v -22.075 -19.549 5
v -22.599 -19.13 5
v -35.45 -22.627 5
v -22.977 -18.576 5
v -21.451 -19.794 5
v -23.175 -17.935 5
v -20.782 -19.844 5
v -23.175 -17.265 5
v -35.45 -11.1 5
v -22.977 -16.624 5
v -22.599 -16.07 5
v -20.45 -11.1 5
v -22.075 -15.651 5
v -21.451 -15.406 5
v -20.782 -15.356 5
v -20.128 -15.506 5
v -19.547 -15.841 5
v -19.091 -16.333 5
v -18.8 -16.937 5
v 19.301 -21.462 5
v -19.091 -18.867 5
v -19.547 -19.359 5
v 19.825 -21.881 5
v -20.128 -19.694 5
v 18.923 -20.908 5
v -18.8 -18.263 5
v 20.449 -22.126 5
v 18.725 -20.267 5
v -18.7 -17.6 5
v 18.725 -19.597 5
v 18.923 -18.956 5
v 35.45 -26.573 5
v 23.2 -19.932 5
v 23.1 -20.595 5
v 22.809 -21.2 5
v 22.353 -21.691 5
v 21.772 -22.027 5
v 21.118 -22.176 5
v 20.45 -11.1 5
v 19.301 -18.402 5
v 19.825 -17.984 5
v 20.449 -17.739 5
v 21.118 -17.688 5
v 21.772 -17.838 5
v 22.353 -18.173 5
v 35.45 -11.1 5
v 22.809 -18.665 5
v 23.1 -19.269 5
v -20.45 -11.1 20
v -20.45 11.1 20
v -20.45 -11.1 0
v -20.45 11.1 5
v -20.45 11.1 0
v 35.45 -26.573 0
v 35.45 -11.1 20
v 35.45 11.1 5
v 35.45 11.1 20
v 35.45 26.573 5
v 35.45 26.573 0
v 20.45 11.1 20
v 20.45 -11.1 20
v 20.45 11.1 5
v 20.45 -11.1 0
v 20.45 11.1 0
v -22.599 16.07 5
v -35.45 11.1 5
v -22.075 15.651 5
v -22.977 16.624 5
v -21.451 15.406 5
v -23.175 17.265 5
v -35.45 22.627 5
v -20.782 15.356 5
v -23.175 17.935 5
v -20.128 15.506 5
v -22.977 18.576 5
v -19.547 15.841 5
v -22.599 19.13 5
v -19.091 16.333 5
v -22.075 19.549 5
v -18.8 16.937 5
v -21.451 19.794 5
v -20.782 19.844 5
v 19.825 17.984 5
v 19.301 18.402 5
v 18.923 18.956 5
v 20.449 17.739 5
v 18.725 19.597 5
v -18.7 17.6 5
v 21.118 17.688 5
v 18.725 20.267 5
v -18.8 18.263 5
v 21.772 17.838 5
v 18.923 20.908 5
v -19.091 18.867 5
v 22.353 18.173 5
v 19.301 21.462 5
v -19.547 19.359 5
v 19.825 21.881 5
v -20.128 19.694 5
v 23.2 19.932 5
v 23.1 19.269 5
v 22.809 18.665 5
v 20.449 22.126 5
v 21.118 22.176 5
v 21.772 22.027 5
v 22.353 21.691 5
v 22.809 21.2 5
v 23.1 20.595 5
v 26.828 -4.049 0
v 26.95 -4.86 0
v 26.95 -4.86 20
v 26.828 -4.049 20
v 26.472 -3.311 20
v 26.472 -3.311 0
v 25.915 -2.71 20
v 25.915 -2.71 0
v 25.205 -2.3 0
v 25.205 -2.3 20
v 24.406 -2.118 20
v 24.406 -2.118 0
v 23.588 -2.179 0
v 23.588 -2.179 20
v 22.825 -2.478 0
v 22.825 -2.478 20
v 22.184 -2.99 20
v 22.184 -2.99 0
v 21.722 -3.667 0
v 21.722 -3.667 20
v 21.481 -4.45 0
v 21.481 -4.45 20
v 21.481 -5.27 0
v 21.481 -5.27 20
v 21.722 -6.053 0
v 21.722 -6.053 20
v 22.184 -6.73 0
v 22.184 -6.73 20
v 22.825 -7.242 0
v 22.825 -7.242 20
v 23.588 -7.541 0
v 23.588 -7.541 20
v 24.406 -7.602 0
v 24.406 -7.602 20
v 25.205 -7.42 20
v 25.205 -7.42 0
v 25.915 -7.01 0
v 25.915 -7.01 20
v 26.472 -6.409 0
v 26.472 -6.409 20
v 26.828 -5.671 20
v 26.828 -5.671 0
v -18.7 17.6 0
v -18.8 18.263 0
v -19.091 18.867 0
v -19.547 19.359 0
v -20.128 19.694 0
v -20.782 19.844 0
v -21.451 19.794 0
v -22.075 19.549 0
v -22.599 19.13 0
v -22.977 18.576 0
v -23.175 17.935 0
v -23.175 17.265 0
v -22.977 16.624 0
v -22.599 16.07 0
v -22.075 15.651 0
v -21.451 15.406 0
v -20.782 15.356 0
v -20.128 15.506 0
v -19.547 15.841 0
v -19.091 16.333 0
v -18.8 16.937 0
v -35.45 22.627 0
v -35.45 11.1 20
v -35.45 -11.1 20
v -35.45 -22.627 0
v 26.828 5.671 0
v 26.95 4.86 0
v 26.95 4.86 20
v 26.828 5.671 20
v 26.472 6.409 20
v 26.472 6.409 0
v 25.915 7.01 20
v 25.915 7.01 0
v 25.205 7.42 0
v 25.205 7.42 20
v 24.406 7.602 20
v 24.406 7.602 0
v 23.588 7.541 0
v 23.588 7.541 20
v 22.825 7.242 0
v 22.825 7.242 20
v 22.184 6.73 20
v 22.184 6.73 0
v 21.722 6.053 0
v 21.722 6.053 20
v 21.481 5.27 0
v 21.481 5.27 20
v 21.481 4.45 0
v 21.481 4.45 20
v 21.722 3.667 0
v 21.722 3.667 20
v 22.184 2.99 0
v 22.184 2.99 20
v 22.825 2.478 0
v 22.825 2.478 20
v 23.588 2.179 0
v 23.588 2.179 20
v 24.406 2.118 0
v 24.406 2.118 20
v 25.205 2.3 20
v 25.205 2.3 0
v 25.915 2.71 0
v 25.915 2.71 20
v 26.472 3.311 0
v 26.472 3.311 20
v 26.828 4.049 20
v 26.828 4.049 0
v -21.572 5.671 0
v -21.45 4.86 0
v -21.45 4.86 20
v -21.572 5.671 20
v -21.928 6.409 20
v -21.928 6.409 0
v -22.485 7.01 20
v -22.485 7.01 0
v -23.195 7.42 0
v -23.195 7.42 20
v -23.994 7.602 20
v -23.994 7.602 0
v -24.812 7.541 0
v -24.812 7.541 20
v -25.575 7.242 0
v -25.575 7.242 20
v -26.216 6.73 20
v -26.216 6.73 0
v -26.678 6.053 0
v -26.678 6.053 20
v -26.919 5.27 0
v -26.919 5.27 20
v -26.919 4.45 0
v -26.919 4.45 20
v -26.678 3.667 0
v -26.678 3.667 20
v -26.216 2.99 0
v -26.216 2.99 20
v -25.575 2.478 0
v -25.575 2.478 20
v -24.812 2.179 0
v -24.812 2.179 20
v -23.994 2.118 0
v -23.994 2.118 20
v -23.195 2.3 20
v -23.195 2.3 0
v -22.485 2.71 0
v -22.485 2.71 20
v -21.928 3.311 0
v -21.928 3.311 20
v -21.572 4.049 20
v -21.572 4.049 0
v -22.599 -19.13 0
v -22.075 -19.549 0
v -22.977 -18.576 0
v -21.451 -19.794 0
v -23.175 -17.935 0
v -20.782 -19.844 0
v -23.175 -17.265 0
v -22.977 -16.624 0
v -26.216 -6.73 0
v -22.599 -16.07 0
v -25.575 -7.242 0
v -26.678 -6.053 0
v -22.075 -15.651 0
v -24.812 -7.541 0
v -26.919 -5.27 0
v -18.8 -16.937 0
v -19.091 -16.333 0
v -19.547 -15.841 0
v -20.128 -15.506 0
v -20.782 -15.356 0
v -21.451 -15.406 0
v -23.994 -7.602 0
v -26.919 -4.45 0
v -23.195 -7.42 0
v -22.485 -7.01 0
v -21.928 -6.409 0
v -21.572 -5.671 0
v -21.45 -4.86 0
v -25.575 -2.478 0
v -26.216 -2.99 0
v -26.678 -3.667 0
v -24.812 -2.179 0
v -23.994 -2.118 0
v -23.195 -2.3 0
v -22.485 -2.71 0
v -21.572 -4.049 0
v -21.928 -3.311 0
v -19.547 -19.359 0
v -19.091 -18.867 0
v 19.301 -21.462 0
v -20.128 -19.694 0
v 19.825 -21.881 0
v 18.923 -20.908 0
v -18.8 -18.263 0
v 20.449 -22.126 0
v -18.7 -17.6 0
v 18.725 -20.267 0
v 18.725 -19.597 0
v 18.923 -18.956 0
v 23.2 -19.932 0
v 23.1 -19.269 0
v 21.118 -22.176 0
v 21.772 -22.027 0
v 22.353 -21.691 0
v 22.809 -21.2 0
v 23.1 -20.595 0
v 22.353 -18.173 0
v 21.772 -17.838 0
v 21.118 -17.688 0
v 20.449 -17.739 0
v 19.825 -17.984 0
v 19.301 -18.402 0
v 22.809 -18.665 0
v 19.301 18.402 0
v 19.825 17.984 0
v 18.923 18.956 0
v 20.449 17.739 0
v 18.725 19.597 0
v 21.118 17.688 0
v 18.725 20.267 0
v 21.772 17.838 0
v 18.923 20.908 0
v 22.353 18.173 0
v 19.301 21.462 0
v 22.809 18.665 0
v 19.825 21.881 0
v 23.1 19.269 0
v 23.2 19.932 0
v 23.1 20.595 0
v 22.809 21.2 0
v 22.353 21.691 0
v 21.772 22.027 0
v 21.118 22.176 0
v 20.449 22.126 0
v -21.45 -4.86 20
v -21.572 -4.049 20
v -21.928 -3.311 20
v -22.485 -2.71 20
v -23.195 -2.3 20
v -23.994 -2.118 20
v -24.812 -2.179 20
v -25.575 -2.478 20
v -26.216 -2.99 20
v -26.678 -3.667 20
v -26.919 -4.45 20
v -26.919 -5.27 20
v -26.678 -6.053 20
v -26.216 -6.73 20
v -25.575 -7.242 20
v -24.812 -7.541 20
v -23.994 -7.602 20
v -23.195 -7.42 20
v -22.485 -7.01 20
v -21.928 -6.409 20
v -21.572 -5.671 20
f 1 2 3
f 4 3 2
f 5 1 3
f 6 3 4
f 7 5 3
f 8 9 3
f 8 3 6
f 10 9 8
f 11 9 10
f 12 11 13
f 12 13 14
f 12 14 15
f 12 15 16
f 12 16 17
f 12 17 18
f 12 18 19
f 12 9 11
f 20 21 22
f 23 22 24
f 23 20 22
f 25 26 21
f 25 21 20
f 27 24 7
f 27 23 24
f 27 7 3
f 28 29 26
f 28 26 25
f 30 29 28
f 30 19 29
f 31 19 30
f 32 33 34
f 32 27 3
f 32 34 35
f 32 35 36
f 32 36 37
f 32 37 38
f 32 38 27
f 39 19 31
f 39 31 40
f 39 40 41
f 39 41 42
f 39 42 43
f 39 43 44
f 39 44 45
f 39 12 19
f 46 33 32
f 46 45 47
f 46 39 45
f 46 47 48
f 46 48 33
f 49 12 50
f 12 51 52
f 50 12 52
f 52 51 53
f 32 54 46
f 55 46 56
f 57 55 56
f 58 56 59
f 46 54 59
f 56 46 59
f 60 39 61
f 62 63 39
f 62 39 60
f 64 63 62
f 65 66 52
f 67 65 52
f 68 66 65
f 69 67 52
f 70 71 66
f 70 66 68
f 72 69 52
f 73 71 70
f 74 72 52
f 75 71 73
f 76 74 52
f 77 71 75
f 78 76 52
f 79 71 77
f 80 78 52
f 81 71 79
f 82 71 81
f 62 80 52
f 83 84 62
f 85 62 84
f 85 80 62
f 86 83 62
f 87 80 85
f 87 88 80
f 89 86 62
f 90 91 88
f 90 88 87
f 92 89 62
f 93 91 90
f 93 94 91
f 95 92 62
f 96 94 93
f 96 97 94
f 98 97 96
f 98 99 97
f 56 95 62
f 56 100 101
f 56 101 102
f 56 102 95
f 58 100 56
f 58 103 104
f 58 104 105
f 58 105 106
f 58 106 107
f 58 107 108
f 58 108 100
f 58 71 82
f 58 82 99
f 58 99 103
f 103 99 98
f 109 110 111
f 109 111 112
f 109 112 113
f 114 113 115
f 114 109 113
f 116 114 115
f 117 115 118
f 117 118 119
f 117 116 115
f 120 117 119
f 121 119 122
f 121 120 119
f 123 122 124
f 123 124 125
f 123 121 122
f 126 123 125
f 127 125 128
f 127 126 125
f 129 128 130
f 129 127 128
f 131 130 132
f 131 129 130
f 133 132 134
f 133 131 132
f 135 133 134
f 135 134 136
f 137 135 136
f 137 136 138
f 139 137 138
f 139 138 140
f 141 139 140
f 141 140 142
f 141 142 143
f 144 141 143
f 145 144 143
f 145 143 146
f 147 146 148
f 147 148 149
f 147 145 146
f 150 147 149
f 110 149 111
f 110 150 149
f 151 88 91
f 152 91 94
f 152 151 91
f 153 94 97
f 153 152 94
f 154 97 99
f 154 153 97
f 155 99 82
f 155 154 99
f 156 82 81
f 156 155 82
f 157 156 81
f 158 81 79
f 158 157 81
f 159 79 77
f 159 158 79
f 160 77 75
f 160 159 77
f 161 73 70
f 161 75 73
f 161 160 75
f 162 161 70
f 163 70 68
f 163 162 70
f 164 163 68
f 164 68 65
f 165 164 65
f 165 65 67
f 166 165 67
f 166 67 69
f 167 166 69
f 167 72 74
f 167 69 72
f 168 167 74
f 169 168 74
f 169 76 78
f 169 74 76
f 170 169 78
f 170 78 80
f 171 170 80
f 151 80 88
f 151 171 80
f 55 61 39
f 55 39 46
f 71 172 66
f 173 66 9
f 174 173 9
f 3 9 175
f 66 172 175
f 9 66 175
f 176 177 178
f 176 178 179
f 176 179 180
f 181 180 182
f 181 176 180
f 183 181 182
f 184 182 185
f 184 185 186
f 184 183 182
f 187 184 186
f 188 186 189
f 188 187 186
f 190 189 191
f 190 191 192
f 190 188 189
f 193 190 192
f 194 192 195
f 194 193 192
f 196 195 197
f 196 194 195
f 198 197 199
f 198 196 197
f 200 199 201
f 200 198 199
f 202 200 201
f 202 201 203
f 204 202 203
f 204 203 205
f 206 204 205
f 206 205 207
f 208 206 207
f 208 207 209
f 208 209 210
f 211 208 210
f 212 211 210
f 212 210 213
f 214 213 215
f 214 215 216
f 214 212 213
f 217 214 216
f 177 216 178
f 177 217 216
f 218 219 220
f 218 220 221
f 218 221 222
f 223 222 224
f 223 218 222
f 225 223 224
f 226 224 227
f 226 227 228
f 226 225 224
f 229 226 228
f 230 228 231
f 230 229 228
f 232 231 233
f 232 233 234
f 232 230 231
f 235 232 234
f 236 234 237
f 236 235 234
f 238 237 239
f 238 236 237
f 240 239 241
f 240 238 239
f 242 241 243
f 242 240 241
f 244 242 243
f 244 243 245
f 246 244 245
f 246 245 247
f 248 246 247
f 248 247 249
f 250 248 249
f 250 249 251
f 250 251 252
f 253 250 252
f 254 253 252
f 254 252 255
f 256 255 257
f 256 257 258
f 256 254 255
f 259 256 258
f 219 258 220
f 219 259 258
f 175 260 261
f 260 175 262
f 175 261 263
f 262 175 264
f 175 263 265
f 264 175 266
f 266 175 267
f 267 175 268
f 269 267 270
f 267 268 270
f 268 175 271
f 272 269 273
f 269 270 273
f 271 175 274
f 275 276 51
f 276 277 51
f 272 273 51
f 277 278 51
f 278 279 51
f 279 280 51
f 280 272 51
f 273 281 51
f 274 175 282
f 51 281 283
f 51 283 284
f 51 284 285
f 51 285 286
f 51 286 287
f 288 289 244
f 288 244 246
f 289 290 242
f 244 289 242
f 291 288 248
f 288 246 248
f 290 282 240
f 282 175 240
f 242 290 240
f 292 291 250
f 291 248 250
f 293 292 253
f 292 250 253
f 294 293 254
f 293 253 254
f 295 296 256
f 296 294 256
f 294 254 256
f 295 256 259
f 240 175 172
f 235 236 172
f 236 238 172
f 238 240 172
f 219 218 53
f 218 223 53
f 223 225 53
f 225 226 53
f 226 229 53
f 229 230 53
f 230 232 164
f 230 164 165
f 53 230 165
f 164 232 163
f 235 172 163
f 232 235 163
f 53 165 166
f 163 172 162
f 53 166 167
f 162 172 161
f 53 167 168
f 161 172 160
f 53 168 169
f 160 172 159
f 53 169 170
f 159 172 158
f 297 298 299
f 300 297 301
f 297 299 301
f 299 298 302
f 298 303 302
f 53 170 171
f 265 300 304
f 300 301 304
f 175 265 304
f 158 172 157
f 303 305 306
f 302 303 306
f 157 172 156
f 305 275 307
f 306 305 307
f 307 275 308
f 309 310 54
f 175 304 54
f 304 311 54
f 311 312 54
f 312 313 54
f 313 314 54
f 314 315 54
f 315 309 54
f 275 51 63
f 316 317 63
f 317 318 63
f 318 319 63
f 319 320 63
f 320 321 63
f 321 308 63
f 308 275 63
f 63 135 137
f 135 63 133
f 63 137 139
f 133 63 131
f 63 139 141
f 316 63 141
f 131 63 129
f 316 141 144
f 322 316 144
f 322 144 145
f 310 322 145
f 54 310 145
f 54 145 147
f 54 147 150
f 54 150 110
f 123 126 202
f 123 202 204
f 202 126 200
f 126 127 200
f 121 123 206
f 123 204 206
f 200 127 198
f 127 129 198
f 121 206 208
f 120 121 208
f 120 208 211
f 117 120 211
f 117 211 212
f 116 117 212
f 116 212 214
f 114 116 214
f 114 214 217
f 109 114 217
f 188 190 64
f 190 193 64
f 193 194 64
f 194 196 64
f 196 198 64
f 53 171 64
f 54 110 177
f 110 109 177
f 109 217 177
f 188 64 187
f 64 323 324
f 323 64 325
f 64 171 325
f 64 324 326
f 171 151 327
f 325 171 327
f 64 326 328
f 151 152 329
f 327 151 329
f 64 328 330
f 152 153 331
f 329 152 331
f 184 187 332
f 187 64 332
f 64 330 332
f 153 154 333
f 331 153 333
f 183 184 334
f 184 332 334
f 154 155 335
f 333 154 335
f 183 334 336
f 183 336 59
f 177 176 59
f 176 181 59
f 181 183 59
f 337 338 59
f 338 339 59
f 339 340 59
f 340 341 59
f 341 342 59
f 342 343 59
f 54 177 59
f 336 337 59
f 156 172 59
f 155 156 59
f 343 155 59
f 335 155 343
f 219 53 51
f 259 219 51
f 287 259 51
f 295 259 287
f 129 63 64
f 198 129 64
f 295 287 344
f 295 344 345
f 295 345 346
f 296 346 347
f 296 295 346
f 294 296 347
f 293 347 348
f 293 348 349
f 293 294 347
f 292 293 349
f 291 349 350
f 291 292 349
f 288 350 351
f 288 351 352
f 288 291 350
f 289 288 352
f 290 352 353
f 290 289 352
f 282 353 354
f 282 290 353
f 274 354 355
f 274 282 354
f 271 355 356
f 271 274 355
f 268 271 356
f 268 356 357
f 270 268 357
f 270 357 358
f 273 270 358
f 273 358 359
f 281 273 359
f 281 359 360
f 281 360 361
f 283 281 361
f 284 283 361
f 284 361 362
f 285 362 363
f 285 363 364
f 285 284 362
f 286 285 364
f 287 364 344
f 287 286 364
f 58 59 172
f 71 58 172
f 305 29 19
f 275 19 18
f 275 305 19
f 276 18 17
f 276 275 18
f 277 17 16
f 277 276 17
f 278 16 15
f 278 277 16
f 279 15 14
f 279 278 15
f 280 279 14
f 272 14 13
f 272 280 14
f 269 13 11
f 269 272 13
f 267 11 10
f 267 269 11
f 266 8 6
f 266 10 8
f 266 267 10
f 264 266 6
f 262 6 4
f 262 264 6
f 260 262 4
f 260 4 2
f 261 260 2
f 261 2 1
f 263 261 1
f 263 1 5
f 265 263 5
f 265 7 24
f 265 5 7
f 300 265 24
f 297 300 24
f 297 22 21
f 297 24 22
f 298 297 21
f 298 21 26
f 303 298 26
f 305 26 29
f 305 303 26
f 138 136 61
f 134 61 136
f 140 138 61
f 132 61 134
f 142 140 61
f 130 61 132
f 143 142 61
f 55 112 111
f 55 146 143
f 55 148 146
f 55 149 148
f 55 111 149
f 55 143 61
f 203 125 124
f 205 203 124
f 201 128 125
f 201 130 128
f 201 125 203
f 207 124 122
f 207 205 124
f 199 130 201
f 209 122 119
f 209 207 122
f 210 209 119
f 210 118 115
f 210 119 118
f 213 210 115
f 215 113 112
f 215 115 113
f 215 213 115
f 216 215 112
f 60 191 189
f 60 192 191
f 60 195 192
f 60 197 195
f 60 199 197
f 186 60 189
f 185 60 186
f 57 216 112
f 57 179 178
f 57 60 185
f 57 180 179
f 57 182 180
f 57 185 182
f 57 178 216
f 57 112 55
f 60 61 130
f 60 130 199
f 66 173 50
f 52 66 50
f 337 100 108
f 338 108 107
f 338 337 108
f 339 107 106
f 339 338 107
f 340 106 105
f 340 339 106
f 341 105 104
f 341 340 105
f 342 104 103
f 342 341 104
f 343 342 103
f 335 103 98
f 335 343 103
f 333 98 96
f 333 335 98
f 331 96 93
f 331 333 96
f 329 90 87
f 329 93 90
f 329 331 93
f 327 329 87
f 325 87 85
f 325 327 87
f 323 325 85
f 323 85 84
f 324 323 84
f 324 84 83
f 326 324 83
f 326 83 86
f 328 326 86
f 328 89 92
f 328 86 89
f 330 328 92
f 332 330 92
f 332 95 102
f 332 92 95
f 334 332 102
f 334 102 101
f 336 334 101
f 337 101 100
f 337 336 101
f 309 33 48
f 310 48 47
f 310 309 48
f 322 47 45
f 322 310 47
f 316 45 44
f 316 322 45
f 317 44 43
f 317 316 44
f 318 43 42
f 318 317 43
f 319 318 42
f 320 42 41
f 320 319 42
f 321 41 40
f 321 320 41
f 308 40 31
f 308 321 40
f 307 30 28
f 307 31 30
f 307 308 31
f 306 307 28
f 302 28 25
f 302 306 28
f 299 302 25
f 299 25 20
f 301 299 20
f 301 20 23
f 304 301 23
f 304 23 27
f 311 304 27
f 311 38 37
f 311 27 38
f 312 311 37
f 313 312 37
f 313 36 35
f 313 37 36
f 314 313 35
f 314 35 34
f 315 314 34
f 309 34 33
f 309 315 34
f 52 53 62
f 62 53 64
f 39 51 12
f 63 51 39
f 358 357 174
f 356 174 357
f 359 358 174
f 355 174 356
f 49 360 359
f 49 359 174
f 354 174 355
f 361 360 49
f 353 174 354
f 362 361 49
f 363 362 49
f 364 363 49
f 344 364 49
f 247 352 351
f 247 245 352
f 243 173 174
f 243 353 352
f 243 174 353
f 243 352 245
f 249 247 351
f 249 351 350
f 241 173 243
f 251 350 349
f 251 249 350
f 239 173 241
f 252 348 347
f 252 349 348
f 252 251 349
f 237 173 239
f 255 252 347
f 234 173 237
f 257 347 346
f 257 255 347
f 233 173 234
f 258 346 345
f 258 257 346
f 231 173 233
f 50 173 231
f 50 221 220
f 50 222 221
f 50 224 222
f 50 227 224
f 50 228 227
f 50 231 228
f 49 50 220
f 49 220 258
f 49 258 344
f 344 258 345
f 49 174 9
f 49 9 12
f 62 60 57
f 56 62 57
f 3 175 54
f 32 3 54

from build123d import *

# Parameters (mm, degrees)
SKETCH1_W           = 40.9
SKETCH1_H           = 22.2
SKETCH1_R           = 2.25
SKETCH1_R_2         = 2.75
BOSS_EXTRUDE4_DEPTH = 20
SKETCH4_W           = 70.9
SKETCH4_H           = 15.47309833
CUT_EXTRUDE1_DEPTH  = 15


with BuildPart() as part:
    # Sketch1 → Boss-Extrude4 (new body)
    with BuildSketch(Plane.XY):
        Polygon((-35.45, 22.62690167), (-35.45, -22.62690167), (35.45, -26.57309833), (35.45, 26.57309833), align=None)
        Rectangle(SKETCH1_W, SKETCH1_H, mode=Mode.SUBTRACT)
        with Locations((-20.95, 17.6)):
            Circle(SKETCH1_R, mode=Mode.SUBTRACT)
        with Locations((20.95, 19.932096475)):
            Circle(SKETCH1_R, mode=Mode.SUBTRACT)
        with Locations((-24.2, 4.86)):
            Circle(SKETCH1_R_2, mode=Mode.SUBTRACT)
        with Locations((-24.2, -4.86)):
            Circle(SKETCH1_R_2, mode=Mode.SUBTRACT)
        with Locations((24.2, 4.86)):
            Circle(SKETCH1_R_2, mode=Mode.SUBTRACT)
        with Locations((24.2, -4.86)):
            Circle(SKETCH1_R_2, mode=Mode.SUBTRACT)
        with Locations((20.95, -19.932096475)):
            Circle(SKETCH1_R, mode=Mode.SUBTRACT)
        with Locations((-20.95, -17.6)):
            Circle(SKETCH1_R, mode=Mode.SUBTRACT)
    extrude(amount=BOSS_EXTRUDE4_DEPTH)

    # Sketch4 → Cut-Extrude1 (cut)
    with BuildSketch(Plane.XY.offset(20)):
        with Locations((0, 18.836549165)):
            Rectangle(SKETCH4_W, SKETCH4_H)
        with Locations((0, -18.836549165)):
            Rectangle(SKETCH4_W, SKETCH4_H)
    extrude(amount=-CUT_EXTRUDE1_DEPTH, mode=Mode.SUBTRACT)


solid = part.part
